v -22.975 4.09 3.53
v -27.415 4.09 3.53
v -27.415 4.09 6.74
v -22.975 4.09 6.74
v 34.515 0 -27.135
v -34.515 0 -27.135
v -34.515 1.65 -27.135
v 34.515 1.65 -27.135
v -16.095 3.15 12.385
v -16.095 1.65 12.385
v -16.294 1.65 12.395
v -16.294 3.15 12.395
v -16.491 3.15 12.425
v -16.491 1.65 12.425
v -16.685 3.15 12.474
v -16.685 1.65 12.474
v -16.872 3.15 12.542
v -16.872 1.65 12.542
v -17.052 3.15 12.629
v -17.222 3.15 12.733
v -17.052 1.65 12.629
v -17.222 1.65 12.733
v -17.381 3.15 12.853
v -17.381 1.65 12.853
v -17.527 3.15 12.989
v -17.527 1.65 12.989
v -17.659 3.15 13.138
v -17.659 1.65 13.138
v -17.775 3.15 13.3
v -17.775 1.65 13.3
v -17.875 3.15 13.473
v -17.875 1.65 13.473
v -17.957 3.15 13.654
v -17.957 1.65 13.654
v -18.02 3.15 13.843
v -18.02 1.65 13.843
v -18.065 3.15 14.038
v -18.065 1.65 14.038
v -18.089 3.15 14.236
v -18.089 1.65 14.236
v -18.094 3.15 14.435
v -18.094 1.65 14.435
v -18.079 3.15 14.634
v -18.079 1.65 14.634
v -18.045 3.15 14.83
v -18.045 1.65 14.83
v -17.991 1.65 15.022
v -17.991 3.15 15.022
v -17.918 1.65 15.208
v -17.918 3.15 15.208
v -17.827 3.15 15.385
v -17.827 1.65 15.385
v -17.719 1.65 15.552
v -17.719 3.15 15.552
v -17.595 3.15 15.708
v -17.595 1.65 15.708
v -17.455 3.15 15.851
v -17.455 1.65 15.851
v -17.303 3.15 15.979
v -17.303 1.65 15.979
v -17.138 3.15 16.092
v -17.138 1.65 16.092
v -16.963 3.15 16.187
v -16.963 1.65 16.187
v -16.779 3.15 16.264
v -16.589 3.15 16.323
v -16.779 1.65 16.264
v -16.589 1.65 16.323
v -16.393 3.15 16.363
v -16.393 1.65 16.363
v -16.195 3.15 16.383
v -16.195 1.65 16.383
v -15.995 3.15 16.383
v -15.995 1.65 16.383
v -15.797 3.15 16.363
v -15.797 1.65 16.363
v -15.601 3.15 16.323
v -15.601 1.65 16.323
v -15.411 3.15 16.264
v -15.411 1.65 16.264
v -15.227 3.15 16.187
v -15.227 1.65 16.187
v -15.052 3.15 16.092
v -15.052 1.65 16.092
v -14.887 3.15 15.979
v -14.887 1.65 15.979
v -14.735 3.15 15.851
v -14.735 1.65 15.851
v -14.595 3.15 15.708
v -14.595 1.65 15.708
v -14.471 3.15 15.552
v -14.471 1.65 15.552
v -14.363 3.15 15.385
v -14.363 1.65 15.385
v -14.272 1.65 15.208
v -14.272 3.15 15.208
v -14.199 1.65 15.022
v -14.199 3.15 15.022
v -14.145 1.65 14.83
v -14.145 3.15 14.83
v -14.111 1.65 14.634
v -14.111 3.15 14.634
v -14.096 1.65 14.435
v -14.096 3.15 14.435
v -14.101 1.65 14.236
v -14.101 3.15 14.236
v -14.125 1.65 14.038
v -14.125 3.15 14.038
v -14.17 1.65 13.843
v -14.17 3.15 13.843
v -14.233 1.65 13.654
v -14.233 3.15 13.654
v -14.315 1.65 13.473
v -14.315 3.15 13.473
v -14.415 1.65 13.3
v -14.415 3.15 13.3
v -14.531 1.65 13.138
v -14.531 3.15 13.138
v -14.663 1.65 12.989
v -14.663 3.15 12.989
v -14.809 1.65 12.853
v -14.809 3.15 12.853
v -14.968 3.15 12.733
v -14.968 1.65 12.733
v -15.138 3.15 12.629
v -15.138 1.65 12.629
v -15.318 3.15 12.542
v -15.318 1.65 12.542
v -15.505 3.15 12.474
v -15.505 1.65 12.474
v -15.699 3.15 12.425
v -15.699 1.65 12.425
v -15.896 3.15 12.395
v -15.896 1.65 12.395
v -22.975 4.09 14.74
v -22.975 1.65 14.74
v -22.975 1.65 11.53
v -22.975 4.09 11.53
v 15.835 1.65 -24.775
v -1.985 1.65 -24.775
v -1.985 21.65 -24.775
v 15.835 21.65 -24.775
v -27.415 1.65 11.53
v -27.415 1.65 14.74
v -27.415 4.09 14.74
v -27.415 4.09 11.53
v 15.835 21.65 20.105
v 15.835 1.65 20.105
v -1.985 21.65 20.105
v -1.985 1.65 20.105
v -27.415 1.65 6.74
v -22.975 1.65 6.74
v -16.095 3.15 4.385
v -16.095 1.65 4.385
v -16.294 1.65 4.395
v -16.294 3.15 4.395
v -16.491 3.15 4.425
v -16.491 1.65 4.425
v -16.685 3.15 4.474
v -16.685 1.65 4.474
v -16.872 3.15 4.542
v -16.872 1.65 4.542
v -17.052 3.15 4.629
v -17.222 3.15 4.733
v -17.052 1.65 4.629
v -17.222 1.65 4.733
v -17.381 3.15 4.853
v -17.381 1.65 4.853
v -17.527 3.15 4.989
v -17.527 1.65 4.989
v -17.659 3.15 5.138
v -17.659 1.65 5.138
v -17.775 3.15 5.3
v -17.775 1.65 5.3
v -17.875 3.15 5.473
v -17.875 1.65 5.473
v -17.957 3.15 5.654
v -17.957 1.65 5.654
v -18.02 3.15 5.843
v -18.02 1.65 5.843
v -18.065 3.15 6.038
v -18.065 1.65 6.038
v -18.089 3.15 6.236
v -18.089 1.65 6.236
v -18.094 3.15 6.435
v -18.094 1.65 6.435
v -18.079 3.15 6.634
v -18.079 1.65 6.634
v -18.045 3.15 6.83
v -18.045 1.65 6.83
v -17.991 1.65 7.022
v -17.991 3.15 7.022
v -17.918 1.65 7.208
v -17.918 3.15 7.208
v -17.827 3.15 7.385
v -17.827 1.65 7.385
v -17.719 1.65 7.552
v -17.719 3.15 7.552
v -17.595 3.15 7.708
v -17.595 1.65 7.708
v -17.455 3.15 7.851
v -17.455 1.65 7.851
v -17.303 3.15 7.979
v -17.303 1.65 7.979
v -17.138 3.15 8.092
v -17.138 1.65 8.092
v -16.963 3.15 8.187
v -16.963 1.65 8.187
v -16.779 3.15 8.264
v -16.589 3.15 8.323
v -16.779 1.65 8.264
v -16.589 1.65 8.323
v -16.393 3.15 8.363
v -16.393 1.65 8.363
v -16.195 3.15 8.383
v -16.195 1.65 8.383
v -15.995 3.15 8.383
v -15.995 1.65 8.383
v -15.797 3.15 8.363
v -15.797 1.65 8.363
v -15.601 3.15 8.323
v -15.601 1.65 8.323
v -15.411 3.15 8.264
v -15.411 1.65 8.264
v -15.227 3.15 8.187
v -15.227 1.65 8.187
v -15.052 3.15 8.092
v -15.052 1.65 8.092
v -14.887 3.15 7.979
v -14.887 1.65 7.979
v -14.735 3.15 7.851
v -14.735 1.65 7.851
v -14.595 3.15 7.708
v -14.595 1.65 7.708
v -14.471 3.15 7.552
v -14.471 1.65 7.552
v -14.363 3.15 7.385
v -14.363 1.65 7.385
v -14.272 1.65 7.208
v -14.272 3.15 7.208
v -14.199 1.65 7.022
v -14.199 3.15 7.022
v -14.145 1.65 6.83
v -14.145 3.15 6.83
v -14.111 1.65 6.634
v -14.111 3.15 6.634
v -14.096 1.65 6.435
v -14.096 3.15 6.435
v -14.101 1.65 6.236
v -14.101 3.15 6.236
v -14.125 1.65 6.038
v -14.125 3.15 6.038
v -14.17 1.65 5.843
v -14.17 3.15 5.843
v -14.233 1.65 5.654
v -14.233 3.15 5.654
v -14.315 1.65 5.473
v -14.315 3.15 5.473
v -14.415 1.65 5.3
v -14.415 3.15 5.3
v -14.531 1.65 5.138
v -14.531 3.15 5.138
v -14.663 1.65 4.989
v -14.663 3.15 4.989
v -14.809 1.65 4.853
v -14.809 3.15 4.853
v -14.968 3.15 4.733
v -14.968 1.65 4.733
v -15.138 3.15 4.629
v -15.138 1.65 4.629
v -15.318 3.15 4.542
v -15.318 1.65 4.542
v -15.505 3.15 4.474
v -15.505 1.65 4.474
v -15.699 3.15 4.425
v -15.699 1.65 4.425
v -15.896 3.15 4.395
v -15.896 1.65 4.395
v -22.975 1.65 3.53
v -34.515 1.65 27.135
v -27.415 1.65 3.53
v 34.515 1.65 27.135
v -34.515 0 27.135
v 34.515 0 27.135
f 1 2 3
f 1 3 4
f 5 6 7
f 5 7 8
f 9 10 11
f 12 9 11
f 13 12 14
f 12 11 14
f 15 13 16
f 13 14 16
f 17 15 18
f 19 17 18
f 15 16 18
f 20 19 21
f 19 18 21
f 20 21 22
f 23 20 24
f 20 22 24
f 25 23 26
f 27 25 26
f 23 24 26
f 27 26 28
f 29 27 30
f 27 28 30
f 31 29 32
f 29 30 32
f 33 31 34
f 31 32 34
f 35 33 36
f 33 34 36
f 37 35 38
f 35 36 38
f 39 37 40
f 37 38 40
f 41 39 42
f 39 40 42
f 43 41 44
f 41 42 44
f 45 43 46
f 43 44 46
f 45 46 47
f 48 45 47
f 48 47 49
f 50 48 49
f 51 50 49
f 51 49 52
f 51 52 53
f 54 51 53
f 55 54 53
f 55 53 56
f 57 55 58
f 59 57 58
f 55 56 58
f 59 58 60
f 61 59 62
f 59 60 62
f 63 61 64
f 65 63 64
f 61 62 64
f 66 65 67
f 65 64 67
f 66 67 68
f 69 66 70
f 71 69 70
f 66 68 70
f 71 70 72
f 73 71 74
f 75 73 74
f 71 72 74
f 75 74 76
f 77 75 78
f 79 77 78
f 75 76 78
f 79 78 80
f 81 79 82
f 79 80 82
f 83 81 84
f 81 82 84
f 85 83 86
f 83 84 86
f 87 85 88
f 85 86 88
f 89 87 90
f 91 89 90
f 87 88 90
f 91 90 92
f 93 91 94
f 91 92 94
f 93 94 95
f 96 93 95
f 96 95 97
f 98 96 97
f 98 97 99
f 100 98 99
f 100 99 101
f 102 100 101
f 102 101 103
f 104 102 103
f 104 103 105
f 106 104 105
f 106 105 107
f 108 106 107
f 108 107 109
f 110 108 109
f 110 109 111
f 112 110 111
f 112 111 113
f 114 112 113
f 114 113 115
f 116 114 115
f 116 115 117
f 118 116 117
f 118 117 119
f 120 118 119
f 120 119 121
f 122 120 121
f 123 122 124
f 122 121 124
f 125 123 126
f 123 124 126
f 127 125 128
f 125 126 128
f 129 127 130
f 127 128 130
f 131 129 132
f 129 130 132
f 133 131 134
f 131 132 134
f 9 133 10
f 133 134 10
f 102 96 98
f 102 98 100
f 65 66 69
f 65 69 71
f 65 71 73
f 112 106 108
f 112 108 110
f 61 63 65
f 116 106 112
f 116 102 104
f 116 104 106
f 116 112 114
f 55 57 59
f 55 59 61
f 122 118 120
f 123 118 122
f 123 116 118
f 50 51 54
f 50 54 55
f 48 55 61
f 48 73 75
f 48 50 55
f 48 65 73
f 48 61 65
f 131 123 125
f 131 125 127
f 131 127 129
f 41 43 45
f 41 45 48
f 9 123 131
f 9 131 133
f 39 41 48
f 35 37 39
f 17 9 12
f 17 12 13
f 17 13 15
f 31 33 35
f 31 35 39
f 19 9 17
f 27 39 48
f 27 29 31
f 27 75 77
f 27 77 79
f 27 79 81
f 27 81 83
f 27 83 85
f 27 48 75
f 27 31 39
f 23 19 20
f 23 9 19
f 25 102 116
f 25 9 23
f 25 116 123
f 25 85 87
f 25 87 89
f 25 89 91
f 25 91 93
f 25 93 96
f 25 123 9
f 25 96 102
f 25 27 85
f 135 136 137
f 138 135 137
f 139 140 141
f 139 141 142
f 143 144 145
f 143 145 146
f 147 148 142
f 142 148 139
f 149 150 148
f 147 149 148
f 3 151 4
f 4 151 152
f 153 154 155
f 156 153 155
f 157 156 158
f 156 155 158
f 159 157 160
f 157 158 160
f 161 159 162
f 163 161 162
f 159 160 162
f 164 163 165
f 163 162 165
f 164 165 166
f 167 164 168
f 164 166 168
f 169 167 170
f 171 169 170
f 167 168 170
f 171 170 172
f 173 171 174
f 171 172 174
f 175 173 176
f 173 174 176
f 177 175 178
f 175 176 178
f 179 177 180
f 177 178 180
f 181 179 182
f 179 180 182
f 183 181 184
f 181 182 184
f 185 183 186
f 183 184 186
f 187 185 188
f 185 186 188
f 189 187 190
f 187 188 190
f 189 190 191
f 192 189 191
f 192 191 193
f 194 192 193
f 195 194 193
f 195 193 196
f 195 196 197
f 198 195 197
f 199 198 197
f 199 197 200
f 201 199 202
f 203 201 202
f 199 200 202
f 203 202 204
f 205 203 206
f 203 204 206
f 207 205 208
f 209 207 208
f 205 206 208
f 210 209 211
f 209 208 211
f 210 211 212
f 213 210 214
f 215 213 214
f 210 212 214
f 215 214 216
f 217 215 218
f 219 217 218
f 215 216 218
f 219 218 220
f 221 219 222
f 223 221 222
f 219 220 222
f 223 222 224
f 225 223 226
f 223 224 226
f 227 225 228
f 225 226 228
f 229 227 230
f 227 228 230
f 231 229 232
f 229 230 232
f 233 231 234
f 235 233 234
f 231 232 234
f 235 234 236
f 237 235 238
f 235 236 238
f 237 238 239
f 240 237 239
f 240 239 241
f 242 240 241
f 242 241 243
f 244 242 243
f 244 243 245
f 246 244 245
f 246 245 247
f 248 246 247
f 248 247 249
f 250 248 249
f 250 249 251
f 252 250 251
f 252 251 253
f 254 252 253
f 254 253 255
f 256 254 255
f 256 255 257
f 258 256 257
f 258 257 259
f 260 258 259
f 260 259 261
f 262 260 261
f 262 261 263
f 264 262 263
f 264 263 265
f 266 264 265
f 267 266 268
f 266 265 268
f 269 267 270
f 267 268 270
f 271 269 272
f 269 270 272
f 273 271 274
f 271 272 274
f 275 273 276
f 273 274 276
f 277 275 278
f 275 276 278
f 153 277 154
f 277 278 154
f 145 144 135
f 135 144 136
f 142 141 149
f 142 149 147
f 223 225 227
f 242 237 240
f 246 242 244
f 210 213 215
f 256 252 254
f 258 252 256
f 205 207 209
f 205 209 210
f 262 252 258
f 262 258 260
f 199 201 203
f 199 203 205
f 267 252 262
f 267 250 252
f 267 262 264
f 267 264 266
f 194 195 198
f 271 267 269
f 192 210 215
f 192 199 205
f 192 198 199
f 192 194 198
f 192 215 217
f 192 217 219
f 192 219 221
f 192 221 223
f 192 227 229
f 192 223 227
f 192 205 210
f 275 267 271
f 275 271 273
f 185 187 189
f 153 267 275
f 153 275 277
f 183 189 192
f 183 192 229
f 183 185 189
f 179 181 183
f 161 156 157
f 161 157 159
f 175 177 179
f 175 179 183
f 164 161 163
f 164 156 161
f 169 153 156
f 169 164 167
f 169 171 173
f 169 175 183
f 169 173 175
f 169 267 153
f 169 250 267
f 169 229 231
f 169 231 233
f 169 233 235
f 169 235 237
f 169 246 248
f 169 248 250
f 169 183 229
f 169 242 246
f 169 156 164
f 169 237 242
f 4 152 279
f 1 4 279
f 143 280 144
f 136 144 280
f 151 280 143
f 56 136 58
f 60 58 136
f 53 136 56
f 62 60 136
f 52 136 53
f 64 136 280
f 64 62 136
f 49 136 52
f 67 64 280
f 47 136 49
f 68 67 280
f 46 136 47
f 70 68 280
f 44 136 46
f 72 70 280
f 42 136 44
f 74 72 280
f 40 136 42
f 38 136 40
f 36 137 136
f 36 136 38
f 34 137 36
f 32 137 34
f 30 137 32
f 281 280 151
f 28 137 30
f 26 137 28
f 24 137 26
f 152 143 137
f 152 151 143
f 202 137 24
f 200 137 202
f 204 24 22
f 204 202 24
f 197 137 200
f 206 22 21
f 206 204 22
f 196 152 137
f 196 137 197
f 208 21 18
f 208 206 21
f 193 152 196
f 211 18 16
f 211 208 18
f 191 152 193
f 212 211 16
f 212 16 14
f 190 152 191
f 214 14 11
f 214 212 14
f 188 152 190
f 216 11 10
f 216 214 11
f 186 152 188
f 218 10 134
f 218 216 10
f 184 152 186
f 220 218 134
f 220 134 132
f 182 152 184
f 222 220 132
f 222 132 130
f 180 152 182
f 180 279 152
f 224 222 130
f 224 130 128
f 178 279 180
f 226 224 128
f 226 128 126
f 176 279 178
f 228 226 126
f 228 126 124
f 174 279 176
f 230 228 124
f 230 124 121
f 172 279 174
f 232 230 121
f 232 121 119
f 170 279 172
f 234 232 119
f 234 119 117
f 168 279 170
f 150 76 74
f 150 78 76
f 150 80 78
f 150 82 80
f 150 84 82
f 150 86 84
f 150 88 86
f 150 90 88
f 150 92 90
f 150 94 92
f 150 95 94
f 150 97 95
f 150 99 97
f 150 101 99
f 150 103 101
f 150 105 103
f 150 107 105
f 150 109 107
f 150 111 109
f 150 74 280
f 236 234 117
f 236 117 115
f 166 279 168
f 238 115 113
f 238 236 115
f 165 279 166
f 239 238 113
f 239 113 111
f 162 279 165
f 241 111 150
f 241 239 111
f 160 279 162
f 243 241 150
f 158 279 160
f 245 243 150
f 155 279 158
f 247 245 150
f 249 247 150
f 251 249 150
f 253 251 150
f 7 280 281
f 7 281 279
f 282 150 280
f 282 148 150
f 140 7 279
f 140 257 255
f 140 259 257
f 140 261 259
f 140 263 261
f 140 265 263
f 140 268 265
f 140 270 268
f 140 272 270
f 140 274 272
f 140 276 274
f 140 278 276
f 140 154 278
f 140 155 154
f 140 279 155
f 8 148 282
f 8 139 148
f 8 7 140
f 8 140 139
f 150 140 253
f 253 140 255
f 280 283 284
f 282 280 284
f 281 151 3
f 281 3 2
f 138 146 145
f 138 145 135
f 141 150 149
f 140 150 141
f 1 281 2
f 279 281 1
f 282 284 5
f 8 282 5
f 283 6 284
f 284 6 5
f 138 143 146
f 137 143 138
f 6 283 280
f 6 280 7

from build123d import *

# Parameters (mm, degrees)
SKETCH1_W           = 69.03
SKETCH1_H           = 54.27
BOSS_EXTRUDE1_DEPTH = 1.65
SKETCH2_R           = 2
BOSS_EXTRUDE2_DEPTH = 1.5
SKETCH3_W           = 4.44
SKETCH3_H           = 3.21
BOSS_EXTRUDE3_DEPTH = 2.44
SKETCH4_W           = 17.82
SKETCH4_H           = 44.88
BOSS_EXTRUDE4_DEPTH = 20


with BuildPart() as part:
    # Sketch1 → Boss-Extrude1 (new body)
    with BuildSketch(Plane(origin=(0, 0, 0), x_dir=(1, 0, 0), z_dir=(0, 1, 0))):
        Rectangle(SKETCH1_W, SKETCH1_H)
    extrude(amount=BOSS_EXTRUDE1_DEPTH)

    # Sketch2 → Boss-Extrude2 (add)
    with BuildSketch(Plane(origin=(0, 1.65, 0), x_dir=(1, 0, 0), z_dir=(0, 1, 0))):
        with Locations(Location((-16.095, -14.385, 0), (0, 0, 90))):
            Circle(SKETCH2_R)
        with Locations(Location((-16.095, -6.385, 0), (0, 0, 90))):
            Circle(SKETCH2_R)
    extrude(amount=BOSS_EXTRUDE2_DEPTH)

    # Sketch3 → Boss-Extrude3 (add)
    with BuildSketch(Plane(origin=(0, 1.65, 0), x_dir=(1, 0, 0), z_dir=(0, 1, 0))):
        with Locations((-25.195, -13.135)):
            Rectangle(SKETCH3_W, SKETCH3_H)
        with Locations((-25.195, -5.135)):
            Rectangle(SKETCH3_W, SKETCH3_H)
    extrude(amount=BOSS_EXTRUDE3_DEPTH)

    # Sketch4 → Boss-Extrude4 (add)
    with BuildSketch(Plane(origin=(0, 1.65, 0), x_dir=(1, 0, 0), z_dir=(0, 1, 0))):
        with Locations((6.925, 2.335)):
            Rectangle(SKETCH4_W, SKETCH4_H)
    extrude(amount=BOSS_EXTRUDE4_DEPTH)


solid = part.part
